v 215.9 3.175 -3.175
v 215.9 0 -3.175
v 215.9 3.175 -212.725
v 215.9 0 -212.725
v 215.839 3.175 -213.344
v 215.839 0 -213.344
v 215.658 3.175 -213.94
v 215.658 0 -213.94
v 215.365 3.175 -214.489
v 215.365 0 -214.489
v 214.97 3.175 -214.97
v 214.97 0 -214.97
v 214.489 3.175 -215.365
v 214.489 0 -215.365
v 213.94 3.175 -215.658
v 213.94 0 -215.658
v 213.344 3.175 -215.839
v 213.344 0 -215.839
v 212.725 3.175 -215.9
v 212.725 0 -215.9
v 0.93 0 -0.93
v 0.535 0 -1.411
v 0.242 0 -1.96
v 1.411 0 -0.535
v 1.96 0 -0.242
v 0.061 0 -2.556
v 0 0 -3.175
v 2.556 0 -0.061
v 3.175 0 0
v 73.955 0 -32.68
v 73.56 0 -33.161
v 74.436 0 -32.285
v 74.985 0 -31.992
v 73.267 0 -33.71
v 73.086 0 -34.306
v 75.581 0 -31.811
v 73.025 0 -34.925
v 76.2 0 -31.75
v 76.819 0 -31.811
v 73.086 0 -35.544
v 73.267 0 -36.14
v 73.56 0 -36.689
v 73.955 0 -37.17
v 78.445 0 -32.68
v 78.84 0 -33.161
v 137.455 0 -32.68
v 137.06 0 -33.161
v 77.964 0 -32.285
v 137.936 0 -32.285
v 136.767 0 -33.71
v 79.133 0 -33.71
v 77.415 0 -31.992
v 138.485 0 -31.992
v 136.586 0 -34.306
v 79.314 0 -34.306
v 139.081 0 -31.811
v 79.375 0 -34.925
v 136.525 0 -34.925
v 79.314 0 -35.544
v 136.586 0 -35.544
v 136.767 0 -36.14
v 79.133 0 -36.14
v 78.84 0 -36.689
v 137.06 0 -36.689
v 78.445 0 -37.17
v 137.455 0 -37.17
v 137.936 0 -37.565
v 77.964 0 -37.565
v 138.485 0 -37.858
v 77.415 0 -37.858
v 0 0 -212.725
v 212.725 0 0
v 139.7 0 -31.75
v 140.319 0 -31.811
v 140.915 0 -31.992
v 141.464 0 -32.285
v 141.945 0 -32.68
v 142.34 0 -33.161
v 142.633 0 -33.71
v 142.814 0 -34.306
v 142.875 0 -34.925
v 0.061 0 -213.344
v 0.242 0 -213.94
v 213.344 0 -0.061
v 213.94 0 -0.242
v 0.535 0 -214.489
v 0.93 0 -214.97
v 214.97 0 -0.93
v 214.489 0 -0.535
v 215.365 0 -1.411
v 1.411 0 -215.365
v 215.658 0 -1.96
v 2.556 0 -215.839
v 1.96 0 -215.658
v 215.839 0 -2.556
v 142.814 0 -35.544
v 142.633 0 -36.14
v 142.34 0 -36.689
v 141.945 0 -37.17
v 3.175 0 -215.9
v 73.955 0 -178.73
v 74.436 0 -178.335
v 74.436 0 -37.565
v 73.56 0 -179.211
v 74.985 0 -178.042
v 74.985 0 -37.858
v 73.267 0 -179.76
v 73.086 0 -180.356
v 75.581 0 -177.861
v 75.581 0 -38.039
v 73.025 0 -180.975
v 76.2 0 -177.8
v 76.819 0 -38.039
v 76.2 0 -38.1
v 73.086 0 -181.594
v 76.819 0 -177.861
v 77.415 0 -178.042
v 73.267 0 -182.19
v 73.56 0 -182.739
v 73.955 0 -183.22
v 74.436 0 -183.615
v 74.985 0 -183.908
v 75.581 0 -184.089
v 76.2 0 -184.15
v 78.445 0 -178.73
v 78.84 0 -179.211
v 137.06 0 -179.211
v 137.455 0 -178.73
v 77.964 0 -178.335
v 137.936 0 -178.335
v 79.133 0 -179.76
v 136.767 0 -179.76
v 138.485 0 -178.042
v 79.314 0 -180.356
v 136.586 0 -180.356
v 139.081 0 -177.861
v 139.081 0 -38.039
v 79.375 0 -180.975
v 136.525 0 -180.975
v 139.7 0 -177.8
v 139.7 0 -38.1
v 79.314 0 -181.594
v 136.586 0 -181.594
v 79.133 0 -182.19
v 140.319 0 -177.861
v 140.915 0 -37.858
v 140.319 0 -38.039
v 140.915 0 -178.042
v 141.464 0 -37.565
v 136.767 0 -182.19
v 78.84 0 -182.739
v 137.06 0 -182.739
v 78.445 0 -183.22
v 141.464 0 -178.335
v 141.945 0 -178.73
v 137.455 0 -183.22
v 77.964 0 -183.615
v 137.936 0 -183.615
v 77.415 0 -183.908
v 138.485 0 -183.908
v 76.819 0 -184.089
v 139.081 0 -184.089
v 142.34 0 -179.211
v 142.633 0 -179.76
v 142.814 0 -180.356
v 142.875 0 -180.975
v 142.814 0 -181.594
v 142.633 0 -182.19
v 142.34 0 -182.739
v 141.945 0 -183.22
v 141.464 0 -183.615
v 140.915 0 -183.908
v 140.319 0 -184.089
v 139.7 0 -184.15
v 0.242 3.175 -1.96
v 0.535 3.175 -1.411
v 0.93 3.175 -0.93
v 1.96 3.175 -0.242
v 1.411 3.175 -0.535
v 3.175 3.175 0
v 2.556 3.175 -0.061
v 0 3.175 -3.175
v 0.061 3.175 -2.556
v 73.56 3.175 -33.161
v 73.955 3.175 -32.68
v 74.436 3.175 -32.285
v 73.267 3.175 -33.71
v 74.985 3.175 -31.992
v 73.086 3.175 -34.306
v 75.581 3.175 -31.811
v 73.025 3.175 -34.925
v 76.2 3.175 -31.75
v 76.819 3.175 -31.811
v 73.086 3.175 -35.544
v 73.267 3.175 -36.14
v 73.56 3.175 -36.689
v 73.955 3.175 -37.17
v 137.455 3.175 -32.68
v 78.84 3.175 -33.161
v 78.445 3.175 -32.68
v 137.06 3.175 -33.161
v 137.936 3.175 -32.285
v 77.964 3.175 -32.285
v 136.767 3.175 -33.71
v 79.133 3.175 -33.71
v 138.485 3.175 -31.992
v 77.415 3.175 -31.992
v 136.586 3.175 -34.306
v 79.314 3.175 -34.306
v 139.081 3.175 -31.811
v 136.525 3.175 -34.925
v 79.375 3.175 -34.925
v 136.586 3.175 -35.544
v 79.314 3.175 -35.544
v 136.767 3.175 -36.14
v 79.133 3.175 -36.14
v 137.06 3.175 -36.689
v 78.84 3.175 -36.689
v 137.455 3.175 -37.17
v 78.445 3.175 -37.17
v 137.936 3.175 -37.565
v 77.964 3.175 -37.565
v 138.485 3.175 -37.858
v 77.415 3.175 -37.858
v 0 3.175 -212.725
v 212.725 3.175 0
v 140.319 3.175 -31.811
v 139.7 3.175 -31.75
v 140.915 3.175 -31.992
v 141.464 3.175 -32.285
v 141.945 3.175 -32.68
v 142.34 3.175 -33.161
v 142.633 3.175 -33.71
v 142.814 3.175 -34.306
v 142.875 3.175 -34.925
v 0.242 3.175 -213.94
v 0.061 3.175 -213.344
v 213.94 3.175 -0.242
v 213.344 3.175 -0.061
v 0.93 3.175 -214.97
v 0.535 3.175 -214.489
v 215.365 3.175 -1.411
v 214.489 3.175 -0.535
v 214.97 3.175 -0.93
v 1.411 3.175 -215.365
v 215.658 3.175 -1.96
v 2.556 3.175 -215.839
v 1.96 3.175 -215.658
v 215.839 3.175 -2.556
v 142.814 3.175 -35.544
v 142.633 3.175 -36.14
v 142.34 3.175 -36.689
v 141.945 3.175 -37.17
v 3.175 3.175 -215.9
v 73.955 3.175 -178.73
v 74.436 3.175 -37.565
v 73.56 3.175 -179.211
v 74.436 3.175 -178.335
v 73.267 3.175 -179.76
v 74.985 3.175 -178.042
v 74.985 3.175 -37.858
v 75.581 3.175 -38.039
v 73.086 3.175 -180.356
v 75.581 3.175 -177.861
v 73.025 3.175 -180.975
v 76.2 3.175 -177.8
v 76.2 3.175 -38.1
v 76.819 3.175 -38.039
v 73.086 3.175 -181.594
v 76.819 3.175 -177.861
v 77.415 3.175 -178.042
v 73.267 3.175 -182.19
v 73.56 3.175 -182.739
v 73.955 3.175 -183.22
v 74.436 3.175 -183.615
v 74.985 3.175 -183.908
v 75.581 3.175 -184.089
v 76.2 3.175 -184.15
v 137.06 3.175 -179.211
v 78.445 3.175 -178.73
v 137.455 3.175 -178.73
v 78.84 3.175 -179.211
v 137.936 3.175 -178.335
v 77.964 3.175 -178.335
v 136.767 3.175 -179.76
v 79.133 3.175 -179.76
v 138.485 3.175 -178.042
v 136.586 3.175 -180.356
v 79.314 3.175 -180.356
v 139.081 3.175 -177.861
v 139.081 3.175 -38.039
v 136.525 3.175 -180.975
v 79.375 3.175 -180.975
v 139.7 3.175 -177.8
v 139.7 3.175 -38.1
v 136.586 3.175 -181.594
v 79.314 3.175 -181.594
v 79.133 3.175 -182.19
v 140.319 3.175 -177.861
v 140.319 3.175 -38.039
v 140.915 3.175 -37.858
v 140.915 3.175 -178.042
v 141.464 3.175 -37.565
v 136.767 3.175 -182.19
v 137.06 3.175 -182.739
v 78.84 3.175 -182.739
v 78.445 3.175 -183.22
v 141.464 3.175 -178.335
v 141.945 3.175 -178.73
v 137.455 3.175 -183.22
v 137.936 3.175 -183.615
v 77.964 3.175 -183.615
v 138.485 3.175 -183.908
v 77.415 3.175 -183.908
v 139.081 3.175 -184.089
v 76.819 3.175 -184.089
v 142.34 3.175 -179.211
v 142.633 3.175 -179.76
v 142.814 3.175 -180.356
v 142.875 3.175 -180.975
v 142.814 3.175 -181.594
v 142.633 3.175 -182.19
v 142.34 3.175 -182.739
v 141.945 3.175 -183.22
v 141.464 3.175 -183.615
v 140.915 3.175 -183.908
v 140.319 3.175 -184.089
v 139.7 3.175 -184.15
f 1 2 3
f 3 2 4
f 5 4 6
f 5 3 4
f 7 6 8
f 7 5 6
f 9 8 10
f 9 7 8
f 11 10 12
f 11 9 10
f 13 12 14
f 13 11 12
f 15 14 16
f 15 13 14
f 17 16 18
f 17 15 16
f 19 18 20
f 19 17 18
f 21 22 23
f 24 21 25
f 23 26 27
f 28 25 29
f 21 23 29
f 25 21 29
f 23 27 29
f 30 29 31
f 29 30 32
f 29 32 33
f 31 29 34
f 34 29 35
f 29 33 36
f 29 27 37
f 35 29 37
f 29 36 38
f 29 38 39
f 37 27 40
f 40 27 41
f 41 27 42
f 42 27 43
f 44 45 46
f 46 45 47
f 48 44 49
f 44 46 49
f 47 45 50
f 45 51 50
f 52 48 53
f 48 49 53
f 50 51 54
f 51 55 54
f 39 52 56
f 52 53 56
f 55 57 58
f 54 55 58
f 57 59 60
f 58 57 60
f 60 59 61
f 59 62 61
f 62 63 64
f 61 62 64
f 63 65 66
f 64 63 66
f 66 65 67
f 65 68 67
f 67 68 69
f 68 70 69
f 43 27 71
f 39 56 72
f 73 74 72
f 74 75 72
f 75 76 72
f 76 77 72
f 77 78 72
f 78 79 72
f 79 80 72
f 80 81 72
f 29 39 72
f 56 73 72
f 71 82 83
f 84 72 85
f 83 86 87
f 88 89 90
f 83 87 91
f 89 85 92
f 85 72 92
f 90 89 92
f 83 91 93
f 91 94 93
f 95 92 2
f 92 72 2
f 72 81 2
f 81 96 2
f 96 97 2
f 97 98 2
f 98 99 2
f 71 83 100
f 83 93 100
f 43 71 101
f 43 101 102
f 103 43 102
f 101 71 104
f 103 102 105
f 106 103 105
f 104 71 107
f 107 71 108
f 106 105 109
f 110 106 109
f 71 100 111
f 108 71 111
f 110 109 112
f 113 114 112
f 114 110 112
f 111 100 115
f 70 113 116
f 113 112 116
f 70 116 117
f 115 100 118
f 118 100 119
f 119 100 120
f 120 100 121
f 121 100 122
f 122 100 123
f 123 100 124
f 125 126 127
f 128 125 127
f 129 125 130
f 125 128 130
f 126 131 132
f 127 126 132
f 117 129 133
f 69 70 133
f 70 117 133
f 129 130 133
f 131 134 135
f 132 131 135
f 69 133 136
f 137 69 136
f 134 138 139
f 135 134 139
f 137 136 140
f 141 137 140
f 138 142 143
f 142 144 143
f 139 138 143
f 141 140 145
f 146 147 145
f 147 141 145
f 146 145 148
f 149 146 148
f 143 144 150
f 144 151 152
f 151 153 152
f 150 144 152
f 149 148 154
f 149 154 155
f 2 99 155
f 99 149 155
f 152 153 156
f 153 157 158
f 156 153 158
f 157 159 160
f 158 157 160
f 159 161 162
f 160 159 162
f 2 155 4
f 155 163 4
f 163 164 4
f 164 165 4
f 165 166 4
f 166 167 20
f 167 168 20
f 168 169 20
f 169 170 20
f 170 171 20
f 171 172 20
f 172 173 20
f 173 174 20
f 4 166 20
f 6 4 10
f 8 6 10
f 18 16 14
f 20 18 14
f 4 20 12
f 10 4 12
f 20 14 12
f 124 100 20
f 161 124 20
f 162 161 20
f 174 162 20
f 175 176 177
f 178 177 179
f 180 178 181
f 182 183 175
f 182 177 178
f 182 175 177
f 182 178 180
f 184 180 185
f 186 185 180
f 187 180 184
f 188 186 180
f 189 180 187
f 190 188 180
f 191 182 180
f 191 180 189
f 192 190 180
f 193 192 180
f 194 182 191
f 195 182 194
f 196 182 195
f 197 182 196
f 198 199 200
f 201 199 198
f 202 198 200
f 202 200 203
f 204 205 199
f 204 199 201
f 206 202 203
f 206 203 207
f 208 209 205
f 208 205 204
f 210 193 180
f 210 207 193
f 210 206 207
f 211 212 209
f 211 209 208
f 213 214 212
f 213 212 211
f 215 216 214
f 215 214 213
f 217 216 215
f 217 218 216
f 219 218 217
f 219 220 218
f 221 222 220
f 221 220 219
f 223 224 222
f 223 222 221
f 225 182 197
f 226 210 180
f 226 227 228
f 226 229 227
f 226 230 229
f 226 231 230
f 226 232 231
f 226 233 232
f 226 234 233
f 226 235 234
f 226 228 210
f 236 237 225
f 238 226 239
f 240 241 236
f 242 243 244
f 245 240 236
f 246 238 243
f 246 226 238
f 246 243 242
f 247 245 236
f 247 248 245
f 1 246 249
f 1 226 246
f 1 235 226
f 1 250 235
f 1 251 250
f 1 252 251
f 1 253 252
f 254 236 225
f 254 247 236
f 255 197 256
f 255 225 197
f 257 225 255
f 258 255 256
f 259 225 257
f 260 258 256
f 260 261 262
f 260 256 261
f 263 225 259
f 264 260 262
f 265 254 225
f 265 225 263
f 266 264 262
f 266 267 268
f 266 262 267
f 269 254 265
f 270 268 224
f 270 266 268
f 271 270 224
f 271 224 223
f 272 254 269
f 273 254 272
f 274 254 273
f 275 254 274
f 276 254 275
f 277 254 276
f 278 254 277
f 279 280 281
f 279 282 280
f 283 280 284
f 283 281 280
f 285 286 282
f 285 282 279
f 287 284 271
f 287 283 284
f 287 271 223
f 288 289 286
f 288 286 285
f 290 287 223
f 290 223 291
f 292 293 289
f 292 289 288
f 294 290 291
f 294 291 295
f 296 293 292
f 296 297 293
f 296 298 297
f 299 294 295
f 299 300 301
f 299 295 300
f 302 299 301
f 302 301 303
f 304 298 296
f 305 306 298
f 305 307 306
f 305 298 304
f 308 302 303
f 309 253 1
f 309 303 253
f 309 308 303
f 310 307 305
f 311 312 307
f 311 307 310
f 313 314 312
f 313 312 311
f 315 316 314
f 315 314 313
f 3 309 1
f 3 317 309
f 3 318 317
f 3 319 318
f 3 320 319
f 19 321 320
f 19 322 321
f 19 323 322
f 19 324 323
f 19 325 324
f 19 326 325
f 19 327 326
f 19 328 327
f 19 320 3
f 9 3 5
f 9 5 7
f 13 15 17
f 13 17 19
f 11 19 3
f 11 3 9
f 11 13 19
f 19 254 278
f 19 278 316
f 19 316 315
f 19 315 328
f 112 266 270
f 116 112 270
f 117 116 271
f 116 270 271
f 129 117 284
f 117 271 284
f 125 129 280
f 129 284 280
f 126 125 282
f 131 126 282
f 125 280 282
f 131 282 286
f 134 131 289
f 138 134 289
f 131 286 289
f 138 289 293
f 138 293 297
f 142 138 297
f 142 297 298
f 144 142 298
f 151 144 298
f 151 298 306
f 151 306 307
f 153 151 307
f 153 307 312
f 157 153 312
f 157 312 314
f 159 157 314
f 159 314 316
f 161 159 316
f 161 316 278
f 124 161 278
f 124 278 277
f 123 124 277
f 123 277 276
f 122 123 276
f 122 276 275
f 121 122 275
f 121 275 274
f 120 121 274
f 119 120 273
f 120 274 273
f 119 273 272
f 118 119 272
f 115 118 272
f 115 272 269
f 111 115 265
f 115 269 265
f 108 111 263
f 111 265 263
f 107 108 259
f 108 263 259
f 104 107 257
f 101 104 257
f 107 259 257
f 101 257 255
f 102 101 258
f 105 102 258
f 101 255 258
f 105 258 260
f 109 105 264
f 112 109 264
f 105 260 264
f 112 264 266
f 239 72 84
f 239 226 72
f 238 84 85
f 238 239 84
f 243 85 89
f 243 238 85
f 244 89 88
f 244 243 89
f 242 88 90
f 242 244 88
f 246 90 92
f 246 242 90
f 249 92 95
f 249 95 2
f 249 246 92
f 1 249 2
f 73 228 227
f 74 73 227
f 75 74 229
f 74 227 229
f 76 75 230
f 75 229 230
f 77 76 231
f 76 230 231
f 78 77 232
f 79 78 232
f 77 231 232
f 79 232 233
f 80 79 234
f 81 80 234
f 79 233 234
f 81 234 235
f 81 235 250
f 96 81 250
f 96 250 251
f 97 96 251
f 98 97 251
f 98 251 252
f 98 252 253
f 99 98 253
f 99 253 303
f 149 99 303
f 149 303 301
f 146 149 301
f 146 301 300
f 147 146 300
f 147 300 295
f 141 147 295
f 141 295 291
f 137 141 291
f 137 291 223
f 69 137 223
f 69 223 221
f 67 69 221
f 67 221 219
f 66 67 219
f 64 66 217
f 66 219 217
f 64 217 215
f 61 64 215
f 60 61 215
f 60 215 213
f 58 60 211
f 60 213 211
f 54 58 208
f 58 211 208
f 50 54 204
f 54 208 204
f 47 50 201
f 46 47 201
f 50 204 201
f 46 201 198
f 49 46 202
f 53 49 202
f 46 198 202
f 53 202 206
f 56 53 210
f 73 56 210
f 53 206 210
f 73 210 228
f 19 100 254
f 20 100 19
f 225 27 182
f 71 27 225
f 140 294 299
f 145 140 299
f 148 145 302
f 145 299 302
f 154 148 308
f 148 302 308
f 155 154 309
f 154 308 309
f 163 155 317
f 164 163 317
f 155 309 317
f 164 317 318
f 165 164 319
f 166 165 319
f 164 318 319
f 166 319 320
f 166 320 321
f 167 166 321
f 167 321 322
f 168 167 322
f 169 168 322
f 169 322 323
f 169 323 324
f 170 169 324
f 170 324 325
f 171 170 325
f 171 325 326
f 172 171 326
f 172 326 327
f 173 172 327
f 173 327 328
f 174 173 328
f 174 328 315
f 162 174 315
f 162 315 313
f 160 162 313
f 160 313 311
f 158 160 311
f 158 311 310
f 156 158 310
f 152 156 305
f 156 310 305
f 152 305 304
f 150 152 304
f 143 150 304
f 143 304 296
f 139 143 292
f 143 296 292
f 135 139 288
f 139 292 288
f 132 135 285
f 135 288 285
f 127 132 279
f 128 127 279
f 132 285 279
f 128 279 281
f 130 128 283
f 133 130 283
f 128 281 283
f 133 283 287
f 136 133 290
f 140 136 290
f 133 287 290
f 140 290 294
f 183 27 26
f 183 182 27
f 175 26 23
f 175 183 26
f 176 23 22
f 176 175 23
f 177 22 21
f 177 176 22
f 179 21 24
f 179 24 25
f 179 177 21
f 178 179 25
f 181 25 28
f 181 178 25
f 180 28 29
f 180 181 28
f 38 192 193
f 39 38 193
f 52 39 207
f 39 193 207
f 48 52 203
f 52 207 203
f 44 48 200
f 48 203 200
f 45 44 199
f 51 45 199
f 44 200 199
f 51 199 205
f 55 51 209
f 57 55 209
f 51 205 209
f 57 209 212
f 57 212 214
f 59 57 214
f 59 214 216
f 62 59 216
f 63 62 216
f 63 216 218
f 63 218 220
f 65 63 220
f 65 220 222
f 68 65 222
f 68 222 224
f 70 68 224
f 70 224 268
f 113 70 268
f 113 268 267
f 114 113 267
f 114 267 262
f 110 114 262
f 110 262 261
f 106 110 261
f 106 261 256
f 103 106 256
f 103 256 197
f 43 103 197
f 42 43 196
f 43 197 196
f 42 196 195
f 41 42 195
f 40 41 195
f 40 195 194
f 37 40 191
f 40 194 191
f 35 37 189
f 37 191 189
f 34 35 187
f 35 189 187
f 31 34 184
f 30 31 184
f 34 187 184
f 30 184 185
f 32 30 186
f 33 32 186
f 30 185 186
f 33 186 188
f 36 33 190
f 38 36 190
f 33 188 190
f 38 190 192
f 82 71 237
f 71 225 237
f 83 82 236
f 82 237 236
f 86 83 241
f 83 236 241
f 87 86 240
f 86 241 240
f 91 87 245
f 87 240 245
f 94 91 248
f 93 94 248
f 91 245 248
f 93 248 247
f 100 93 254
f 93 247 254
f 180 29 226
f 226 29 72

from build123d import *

# Parameters (mm, degrees)
SKETCH2_W           = 215.9
SKETCH2_H           = 215.9
BOSS_EXTRUDE1_DEPTH = 3.175
FILLET1_R           = 3.175
SKETCH4_R           = 3.175
CUT_EXTRUDE1_DEPTH  = 306.345215494


with BuildPart() as part:
    # Sketch2 → Boss-Extrude1 (new body)
    with BuildSketch(Plane(origin=(0, 0, 0), x_dir=(1, 0, 0), z_dir=(0, 1, 0))):
        with Locations((107.95, 107.95)):
            Rectangle(SKETCH2_W, SKETCH2_H)
    extrude(amount=BOSS_EXTRUDE1_DEPTH)

    # Fillet1
    fillet1_edges = [part.edges().sort_by_distance(p)[0] for p in [
        (0, 1.5875, -215.9),
        (215.9, 1.5875, -215.9),
        (215.9, 1.5875, 0),
        (0, 1.5875, 0),
    ]]
    fillet(fillet1_edges, radius=FILLET1_R)

    # Sketch4 → Cut-Extrude1 (cut, through all)
    with BuildSketch(Plane(origin=(0, 3.175, 0), x_dir=(1, 0, 0), z_dir=(0, 1, 0))):
        with Locations(Location((76.2, 180.975, 0), (0, 0, 270))):
            Circle(SKETCH4_R)
        with Locations(Location((139.7, 180.975, 0), (0, 0, 270))):
            Circle(SKETCH4_R)
        with Locations(Location((139.7, 34.925, 0), (0, 0, 270))):
            Circle(SKETCH4_R)
        with Locations(Location((76.2, 34.925, 0), (0, 0, 270))):
            Circle(SKETCH4_R)
    extrude(amount=-CUT_EXTRUDE1_DEPTH, mode=Mode.SUBTRACT)


solid = part.part
